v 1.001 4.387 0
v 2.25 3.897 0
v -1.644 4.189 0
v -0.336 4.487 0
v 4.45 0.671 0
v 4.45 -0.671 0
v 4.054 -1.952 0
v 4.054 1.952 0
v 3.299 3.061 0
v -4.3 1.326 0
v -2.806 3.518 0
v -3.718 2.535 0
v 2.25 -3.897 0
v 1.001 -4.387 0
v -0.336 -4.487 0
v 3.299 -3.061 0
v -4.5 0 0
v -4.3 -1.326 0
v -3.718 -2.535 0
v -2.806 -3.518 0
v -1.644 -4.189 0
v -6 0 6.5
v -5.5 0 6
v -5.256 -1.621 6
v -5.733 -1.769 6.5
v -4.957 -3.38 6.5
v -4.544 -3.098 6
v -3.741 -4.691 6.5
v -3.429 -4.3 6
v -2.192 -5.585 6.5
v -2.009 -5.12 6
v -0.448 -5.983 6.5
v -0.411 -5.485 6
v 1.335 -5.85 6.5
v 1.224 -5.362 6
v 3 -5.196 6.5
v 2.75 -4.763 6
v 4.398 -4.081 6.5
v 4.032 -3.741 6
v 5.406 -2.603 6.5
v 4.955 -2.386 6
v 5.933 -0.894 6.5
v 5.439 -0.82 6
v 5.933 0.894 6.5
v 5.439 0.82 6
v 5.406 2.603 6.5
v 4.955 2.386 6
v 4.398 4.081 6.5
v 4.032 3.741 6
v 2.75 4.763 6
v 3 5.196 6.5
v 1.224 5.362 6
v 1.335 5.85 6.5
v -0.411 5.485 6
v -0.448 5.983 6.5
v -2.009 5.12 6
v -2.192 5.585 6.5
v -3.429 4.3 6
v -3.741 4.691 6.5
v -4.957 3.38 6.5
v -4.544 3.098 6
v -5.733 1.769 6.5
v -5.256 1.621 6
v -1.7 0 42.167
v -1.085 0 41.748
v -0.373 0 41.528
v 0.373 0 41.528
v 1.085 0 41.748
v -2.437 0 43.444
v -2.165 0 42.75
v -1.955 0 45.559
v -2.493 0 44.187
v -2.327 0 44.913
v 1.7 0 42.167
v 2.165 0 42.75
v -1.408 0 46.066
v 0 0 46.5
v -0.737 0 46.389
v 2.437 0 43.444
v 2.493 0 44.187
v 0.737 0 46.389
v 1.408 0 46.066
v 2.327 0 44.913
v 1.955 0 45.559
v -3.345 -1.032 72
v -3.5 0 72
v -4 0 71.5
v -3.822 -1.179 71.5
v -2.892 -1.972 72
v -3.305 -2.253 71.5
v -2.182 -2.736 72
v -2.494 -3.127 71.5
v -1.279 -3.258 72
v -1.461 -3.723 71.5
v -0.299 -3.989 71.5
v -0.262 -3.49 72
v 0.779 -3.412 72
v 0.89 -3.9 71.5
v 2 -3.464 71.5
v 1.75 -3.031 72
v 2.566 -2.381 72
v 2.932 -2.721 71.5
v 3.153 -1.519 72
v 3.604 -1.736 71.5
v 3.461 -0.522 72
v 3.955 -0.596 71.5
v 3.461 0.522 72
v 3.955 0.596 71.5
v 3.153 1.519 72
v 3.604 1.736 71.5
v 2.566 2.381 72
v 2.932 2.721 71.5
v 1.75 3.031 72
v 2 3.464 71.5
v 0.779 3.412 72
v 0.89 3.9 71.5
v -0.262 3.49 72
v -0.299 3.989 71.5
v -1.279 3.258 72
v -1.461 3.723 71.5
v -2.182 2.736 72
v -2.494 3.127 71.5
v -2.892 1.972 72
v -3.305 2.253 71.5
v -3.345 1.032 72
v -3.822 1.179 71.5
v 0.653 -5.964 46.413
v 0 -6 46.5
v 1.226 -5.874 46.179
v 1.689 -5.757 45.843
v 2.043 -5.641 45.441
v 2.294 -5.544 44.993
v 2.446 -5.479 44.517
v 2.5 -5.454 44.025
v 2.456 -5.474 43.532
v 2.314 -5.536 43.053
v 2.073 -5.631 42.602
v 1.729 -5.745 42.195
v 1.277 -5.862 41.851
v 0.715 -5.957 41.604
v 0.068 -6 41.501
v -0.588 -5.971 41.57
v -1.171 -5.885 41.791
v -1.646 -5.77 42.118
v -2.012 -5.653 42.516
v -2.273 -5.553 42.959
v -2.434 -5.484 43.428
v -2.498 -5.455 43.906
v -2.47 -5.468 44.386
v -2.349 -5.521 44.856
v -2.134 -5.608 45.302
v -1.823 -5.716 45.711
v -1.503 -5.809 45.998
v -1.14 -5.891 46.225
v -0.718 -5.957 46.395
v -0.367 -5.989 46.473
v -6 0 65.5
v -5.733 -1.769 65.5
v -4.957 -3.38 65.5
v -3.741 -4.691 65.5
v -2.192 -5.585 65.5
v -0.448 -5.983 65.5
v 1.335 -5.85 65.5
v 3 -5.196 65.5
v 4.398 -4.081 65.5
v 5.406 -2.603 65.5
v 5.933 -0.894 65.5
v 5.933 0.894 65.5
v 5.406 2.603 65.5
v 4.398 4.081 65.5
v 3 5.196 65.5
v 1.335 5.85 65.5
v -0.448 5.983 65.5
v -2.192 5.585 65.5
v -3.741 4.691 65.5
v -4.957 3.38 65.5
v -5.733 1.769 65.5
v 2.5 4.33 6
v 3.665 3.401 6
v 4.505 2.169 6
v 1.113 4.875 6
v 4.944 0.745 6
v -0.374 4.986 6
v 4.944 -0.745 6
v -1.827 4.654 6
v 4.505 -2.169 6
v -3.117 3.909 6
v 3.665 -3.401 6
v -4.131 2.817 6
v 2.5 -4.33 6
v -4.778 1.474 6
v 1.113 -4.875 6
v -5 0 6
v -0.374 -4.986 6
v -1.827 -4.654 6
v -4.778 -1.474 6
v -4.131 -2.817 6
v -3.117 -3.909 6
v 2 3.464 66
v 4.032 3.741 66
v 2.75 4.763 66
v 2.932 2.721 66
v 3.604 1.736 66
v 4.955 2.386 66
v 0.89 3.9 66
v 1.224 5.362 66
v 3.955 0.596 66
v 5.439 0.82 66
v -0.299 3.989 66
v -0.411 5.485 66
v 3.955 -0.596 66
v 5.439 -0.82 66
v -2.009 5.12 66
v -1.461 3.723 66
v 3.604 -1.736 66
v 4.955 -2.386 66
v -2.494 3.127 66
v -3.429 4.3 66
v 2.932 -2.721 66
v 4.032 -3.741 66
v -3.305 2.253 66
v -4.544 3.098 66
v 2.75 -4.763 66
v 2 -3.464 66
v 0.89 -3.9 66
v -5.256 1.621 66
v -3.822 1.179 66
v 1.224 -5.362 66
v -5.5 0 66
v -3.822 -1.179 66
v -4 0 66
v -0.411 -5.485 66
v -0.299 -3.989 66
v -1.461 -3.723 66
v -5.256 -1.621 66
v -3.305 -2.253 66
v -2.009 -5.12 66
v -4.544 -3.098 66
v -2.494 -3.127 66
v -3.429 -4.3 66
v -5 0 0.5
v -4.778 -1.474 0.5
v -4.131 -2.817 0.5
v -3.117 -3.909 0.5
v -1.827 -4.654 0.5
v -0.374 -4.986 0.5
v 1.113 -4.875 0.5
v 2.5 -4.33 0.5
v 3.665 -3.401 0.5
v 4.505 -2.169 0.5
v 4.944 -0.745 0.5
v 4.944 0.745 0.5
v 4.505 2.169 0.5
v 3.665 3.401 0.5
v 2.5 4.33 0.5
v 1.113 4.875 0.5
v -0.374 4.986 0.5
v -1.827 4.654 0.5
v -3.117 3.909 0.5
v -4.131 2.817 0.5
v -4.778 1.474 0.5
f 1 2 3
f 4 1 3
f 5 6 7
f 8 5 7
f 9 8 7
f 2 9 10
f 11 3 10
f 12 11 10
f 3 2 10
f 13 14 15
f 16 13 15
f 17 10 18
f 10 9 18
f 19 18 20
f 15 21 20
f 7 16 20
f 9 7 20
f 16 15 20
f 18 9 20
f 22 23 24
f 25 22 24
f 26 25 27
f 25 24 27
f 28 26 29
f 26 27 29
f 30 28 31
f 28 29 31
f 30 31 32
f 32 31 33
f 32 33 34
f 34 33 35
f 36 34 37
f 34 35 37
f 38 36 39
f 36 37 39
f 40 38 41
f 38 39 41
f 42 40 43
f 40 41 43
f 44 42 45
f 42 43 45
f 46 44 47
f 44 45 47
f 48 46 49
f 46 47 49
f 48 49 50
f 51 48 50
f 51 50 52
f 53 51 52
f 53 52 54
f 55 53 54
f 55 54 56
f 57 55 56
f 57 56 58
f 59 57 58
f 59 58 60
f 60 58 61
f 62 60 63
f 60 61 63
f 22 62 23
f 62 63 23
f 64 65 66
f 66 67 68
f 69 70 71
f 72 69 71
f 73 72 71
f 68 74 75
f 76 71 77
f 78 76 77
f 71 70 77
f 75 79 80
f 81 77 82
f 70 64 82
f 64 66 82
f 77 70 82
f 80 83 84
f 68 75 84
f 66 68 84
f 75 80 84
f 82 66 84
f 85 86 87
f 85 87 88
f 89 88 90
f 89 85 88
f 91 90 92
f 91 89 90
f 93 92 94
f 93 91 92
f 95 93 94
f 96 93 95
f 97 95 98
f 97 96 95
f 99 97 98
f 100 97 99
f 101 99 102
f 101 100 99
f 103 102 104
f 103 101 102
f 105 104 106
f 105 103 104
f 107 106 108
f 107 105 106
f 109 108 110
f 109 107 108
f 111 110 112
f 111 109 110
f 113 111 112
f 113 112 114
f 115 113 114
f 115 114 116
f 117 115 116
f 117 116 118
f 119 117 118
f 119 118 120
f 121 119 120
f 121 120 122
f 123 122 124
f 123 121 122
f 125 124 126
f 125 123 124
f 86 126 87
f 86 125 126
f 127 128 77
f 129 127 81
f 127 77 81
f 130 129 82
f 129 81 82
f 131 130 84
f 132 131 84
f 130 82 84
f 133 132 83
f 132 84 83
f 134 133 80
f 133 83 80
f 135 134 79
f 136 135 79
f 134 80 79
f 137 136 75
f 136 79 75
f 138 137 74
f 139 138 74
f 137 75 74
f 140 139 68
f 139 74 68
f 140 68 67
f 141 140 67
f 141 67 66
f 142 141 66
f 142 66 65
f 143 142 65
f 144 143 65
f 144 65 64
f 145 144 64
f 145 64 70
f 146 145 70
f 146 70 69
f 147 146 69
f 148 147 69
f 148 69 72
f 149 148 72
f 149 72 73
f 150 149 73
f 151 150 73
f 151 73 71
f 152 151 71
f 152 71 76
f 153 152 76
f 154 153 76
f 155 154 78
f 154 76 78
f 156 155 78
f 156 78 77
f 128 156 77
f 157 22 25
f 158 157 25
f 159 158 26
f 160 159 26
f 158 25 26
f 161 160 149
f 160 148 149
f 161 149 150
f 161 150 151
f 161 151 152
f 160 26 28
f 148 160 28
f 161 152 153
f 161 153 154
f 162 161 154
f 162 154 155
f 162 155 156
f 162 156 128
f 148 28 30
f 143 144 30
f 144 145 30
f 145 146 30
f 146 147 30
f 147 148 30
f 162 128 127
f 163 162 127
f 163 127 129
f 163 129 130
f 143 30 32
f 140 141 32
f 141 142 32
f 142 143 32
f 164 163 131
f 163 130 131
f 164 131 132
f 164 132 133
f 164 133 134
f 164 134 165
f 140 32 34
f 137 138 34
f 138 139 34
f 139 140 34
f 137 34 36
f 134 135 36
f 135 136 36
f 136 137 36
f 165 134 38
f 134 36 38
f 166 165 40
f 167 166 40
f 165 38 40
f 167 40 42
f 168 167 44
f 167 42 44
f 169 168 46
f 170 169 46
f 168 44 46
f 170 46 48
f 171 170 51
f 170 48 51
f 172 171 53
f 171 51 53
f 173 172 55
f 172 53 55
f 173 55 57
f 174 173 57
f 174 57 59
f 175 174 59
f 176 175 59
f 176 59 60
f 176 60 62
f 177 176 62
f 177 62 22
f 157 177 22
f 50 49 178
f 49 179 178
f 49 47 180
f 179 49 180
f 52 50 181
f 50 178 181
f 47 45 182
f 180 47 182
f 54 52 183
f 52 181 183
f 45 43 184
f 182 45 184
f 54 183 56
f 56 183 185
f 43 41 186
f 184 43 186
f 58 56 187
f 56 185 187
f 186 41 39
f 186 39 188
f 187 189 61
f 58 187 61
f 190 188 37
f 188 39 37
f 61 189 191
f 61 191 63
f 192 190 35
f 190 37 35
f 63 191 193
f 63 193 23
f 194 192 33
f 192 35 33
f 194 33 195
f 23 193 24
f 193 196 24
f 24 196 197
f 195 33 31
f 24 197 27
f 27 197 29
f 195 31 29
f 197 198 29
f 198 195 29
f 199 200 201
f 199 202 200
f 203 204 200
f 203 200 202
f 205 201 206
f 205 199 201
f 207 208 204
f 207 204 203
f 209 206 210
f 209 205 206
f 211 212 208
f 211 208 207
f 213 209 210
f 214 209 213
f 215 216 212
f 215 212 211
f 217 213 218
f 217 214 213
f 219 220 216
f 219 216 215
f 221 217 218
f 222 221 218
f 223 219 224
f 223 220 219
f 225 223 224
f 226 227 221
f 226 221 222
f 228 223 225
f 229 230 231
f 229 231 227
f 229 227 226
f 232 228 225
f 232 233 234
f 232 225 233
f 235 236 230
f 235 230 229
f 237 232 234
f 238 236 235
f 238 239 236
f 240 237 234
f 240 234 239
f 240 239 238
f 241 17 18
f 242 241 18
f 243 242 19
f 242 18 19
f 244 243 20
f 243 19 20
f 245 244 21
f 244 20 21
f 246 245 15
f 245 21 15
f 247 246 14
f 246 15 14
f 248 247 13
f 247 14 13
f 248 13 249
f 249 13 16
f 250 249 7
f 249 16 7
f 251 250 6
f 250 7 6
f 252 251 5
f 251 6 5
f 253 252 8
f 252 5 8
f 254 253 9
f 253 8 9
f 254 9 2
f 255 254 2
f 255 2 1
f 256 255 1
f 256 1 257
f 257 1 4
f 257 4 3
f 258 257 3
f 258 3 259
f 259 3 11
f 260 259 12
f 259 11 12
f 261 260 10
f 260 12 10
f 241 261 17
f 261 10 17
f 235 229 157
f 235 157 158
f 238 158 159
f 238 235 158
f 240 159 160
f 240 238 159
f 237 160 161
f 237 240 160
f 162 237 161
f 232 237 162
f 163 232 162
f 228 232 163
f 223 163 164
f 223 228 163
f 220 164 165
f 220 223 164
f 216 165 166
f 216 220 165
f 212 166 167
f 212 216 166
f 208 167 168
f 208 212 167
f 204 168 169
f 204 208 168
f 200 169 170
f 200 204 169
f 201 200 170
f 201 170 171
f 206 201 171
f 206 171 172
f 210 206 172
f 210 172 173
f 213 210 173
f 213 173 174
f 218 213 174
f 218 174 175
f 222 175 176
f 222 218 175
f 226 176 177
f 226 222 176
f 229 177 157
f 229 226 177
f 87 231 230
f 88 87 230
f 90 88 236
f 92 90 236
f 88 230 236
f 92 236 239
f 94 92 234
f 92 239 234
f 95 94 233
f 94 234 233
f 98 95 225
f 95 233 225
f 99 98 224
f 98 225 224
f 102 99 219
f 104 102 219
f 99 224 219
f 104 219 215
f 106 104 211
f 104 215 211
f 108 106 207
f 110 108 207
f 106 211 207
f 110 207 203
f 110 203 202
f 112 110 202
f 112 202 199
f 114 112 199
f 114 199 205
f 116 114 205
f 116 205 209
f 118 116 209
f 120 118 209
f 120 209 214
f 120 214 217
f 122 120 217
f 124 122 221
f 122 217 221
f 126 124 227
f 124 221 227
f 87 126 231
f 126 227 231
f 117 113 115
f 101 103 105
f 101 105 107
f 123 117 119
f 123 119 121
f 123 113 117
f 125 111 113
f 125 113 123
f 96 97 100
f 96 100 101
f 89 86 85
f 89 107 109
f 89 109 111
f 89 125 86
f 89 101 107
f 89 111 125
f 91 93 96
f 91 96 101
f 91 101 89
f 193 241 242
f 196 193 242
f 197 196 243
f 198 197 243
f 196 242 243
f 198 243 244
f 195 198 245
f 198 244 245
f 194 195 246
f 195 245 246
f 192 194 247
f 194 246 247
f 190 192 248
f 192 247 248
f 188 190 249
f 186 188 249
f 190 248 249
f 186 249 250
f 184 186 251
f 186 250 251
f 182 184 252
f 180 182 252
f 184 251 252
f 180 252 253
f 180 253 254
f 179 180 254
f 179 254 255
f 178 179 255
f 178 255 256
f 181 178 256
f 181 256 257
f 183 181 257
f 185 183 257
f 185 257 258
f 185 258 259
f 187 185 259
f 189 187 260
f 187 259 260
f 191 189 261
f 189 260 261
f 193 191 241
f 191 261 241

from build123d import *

# Parameters (mm, degrees)
ESQUISSE1_R             = 5
BASE_EXTRUSION_DEPTH    = 6
ESQUISSE2_R             = 6
BOSS_EXTRU_1_DEPTH      = 60
ESQUISSE3_R             = 4
BOSS_EXTRU_2_DEPTH      = 6
CHANFREIN1_SIZE         = 0.5
ESQUISSE4_R             = 2.5
ENL_V_MAT_EXTRU_1_DEPTH = 7


with BuildPart() as part:
    # Esquisse1 → Base-Extrusion (new body)
    with BuildSketch(Plane.XY):
        with Locations(Location((0, 0, 0), (0, 0, 180))):
            Circle(ESQUISSE1_R)
    extrude(amount=BASE_EXTRUSION_DEPTH)

    # Esquisse2 → Boss.-Extru.1 (add)
    with BuildSketch(Plane.XY.offset(6)):
        with Locations(Location((0, 0, 0), (0, 0, 180))):
            Circle(ESQUISSE2_R)
    extrude(amount=BOSS_EXTRU_1_DEPTH)

    # Esquisse3 → Boss.-Extru.2 (add)
    with BuildSketch(Plane.XY.offset(66)):
        with Locations(Location((0, 0, 0), (0, 0, 180))):
            Circle(ESQUISSE3_R)
    extrude(amount=BOSS_EXTRU_2_DEPTH)

    # Chanfrein1
    chanfrein1_edges = [part.edges().sort_by_distance(p)[0] for p in [
        (6, 0, 6),
        (6, 0, 66),
        (5, 0, 0),
        (4, 0, 72),
    ]]
    chamfer(chanfrein1_edges, length=CHANFREIN1_SIZE)

    # Esquisse4 → Enlèv. mat.-Extru.1 (cut)
    with BuildSketch(Plane(origin=(0, 0, 0), x_dir=(1, 0, 0), z_dir=(0, 1, 0))):
        with Locations(Location((0, -44, 0), (0, 0, 270))):
            Circle(ESQUISSE4_R)
    extrude(amount=-ENL_V_MAT_EXTRU_1_DEPTH, mode=Mode.SUBTRACT)


solid = part.part
